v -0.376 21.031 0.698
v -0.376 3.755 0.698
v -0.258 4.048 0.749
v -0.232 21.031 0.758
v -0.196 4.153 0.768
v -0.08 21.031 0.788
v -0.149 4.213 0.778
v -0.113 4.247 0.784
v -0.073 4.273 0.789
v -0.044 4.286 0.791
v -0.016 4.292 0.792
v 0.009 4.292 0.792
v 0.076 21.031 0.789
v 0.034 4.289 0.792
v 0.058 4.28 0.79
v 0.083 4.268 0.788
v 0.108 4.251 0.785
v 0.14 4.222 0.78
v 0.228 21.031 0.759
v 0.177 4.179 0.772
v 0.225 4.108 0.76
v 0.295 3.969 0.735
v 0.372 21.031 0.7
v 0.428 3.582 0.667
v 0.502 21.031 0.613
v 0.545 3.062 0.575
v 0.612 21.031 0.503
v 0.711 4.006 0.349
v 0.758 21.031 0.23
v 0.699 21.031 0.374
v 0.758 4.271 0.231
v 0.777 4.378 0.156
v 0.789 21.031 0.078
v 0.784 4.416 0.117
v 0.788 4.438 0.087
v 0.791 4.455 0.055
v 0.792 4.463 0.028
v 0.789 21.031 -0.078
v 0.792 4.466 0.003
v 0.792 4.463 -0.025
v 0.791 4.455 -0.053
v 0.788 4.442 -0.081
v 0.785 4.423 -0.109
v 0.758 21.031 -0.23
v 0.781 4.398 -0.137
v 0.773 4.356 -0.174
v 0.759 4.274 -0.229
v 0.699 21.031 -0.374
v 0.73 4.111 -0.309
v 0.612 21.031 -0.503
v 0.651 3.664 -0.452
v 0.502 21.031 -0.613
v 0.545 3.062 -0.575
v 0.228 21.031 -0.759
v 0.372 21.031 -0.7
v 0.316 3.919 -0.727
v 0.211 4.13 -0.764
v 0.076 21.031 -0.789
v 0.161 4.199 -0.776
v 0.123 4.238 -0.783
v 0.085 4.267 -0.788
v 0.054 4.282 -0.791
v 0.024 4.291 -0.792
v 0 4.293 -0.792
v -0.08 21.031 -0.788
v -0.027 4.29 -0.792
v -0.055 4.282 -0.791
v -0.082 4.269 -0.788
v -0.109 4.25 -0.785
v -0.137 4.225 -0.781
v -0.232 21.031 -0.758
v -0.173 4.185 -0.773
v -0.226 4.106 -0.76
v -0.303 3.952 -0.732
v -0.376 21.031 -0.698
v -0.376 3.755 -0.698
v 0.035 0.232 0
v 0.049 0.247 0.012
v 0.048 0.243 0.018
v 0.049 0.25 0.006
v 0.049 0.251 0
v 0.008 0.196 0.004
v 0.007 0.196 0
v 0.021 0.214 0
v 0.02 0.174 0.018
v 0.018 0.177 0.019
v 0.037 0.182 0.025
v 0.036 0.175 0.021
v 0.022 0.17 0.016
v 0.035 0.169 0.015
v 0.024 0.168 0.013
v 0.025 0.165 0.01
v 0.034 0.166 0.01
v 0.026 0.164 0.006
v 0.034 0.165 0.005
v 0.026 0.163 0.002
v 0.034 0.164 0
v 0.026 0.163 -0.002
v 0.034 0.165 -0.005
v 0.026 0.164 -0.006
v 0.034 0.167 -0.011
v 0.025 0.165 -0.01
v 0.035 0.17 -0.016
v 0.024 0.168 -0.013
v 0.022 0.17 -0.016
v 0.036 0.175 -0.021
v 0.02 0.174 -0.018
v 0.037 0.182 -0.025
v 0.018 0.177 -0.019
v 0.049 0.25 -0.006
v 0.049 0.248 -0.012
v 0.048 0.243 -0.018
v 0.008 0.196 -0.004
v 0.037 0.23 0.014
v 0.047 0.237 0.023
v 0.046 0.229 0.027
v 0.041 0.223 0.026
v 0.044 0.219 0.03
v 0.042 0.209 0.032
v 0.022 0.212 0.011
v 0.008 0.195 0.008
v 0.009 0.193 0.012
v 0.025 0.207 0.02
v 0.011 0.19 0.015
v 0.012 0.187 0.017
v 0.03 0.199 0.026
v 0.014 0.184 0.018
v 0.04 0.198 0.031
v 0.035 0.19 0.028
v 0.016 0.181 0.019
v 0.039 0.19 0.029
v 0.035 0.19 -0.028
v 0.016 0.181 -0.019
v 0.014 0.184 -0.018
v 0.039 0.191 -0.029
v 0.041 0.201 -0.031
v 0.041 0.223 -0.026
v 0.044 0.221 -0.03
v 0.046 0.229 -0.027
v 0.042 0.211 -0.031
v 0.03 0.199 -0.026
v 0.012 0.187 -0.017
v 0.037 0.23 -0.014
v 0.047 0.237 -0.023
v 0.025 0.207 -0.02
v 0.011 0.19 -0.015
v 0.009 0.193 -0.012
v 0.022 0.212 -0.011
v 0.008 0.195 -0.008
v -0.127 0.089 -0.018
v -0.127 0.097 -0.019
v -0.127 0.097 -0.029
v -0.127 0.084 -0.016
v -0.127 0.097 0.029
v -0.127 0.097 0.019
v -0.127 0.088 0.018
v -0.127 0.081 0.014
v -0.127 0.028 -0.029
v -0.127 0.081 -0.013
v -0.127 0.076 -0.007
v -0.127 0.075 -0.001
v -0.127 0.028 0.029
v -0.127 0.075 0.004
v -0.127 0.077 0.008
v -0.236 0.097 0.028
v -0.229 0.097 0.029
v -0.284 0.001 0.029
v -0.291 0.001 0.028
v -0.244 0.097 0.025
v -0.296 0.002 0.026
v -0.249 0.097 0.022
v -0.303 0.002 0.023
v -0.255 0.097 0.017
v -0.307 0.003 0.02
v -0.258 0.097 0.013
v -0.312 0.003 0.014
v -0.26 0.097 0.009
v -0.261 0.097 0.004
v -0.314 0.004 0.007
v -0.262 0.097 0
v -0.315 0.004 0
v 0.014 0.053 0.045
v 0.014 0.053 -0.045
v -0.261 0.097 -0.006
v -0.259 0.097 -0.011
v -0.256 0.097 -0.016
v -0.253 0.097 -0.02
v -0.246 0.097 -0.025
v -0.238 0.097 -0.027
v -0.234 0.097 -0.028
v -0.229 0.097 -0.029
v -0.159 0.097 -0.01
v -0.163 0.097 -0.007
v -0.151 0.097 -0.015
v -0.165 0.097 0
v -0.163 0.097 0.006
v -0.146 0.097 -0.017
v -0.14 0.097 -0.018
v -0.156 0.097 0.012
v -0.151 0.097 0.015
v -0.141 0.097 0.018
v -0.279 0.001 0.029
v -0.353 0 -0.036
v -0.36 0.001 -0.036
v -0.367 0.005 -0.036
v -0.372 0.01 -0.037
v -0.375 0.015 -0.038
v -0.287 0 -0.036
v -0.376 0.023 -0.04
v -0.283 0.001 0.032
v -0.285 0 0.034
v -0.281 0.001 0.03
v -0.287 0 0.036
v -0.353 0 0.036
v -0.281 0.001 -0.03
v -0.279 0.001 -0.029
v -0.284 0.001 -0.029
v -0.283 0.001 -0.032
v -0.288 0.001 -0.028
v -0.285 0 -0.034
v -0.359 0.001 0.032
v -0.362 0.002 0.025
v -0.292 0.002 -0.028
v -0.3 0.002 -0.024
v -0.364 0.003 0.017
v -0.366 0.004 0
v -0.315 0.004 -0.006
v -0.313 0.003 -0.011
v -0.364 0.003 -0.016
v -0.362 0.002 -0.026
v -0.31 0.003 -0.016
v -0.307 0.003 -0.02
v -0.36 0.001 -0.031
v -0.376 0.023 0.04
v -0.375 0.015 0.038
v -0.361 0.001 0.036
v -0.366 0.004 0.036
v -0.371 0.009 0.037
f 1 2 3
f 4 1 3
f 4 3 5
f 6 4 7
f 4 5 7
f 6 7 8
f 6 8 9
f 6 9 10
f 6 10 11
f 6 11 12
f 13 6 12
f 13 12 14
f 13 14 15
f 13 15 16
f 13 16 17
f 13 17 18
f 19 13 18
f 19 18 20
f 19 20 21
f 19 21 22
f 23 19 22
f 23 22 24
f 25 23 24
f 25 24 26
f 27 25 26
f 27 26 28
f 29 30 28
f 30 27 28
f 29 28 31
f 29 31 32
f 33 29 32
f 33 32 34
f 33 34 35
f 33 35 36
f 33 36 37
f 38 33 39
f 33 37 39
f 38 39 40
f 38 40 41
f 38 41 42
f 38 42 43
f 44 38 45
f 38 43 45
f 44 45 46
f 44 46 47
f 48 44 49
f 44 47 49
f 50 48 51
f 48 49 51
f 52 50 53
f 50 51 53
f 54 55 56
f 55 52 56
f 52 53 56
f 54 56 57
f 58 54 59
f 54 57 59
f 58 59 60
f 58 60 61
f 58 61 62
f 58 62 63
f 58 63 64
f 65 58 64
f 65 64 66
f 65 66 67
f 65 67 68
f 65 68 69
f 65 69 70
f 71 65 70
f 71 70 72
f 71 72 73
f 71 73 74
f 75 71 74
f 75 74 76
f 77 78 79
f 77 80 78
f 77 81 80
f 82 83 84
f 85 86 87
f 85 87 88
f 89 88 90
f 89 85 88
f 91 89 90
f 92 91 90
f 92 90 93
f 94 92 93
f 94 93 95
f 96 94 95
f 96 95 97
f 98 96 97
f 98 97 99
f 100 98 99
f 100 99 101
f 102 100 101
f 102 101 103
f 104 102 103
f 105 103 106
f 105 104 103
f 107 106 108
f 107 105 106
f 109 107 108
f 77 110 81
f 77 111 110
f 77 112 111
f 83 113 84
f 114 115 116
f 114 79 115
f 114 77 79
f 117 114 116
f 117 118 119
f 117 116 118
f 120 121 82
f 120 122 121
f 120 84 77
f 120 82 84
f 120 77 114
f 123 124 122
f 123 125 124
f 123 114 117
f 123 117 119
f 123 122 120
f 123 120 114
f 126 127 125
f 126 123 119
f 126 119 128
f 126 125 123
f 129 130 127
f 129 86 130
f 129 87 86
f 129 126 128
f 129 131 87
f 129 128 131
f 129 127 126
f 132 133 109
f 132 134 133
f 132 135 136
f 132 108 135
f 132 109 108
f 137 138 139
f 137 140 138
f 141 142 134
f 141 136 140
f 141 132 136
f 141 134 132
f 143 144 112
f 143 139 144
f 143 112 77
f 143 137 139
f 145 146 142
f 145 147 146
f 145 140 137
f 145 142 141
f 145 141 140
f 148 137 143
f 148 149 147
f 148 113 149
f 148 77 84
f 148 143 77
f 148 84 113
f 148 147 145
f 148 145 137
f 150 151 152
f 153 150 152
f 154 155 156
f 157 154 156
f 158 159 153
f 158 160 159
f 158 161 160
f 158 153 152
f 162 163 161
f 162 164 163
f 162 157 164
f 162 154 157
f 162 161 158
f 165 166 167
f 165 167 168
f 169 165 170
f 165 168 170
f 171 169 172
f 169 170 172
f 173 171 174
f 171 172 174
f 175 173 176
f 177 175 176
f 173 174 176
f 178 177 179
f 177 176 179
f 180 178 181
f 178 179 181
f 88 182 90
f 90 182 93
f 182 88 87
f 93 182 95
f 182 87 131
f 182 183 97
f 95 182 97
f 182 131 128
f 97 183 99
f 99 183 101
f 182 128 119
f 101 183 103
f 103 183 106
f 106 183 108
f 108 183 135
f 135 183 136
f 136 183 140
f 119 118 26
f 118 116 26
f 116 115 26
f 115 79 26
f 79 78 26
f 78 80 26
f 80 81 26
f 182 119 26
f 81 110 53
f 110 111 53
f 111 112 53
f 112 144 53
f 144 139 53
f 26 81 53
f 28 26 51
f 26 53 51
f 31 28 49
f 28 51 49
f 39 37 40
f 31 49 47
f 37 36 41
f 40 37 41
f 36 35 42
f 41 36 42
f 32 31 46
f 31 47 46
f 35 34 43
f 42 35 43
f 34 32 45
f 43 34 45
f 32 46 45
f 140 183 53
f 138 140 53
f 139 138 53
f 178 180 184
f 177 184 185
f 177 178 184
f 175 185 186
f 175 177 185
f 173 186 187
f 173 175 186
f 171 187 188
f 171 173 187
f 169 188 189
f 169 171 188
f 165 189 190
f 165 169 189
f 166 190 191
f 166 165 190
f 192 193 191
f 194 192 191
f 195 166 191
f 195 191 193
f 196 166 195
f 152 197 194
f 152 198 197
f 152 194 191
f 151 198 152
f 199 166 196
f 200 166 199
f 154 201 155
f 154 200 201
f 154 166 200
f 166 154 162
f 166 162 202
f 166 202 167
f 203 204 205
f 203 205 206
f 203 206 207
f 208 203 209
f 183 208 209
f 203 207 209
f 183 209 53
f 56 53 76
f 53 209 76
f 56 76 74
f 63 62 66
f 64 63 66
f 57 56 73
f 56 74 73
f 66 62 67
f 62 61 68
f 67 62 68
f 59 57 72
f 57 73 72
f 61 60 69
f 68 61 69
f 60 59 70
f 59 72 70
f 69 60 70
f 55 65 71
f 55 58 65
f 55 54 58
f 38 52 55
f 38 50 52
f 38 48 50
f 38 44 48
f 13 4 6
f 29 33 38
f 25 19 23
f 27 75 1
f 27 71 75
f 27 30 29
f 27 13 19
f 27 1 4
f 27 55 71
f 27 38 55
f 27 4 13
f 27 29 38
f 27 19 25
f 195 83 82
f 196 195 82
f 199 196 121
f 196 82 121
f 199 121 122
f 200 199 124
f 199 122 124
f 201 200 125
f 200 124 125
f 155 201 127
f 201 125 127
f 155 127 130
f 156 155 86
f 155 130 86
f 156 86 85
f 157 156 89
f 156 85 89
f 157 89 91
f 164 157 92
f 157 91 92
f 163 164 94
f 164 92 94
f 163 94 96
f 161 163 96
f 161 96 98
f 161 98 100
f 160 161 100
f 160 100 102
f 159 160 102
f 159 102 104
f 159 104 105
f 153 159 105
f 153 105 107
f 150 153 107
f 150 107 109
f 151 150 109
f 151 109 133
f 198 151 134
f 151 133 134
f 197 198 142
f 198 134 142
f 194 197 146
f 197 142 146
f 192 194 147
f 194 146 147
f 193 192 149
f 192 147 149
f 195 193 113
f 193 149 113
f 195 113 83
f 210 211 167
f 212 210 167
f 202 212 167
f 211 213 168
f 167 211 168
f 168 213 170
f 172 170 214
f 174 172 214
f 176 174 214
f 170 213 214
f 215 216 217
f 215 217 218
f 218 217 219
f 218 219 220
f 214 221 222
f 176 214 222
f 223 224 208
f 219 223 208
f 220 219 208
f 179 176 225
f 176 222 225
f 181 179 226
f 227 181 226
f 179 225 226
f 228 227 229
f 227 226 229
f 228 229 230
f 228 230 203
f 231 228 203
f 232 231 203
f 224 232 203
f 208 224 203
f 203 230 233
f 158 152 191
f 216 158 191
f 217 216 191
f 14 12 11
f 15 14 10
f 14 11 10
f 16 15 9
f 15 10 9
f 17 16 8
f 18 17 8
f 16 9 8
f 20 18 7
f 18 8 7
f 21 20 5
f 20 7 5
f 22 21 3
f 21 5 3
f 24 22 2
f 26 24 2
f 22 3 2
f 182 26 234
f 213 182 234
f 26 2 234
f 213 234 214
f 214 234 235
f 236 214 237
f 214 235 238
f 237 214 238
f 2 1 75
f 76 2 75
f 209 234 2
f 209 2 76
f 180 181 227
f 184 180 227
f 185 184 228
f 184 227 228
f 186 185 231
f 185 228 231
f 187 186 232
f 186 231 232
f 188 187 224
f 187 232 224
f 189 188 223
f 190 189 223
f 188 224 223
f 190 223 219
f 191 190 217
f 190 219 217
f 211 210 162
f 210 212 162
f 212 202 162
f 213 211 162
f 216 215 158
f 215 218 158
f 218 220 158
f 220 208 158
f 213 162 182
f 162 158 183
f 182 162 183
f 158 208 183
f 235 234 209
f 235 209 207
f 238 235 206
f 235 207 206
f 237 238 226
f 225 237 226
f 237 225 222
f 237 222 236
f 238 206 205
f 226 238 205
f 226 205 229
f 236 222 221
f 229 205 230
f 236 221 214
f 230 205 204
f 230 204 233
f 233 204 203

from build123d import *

# Parameters (mm, degrees)
TD_SKETCH_R                             = 0.79248
TL_FEATURE_DEPTH                        = 21.0312
TDF_STD_SKETCH_W                        = 2.09296
TDF_STD_SKETCH_H                        = 2.09296
TDF_STD_FEATURE_DEPTH                   = 22.061040395
ISA_20_STD_FEATURE_DEPTH                = 22.061040395
ISA_20_STD_FEATURE_DEPTH_BACK           = 22.061040395
F_10BA_STD_FEATURE_DEPTH                = 22.061040395
F_10BA_STD_FEATURE_DEPTH_BACK           = 22.061040395
FRO_STD_FEATURE_DEPTH                   = 22.061040395
FRO_STD_FEATURE_DEPTH_BACK              = 22.061040395
C_STD_FEATURE_DEPTH                     = 22.061040395
C_STD_FEATURE_DEPTH_BACK                = 22.061040395
ERW_STD_FEATURE_DEPTH                   = 0.028575
H_STD_FEATURE_REACH                     = 22.881
H_STD_SKETCH_R                          = 0.01905
H_STD_SKETCH_3_R                        = 0.01905
FUNNEL_FINAL_DIAMETRE_STD_FEATURE_DEPTH = 2.499995
FUNNEL_FINAL_DIAMETRE_STD_FEATURE_DRAFT = -22.5
ROUND_BR_STD_FEATURE_START              = -1
ROUND_BR_STD_FEATURE_DEPTH              = 1.020088772


with BuildPart() as part:
    # TD_sketch → TL_feature (new body)
    with BuildSketch(Plane(origin=(0, 0, 0), x_dir=(1, 0, 0), z_dir=(0, 1, 0))):
        with Locations(Location((0, 0, 0), (0, 0, 270))):
            Circle(TD_SKETCH_R)
    extrude(amount=TL_FEATURE_DEPTH)

    # TDF_STD_sketch → TDF_STD_feature (cut, through all)
    with BuildSketch(Plane(origin=(0, 0, 0), x_dir=(1, 0, 0), z_dir=(0, 1, 0))):
        with Locations((-1.4224, 0)):
            Rectangle(TDF_STD_SKETCH_W, TDF_STD_SKETCH_H)
    extrude(amount=TDF_STD_FEATURE_DEPTH, mode=Mode.SUBTRACT)

    # ISA_20_STD_sketch → ISA_20_STD_feature (cut, two sides: drawn at the far end of the back side and taken through both)
    with BuildSketch(Plane(origin=(0, 0, 0), x_dir=(0, 0, -1), z_dir=(1, 0, 0)).offset(-ISA_20_STD_FEATURE_DEPTH_BACK)):
        Polygon((-12.952451681, 73.255332957), (-3.743927997, 21.0312), (-0.03556, 0), (0.03556, 0), (3.743927997, 21.0312), (12.952451681, 73.255332957), (12.952451681, -32.804215817), (-12.952451681, -32.804215817), align=None)
    extrude(amount=ISA_20_STD_FEATURE_DEPTH + ISA_20_STD_FEATURE_DEPTH_BACK, mode=Mode.SUBTRACT)

    # 10BA_STD_sketch → 10BA_STD_feature (cut, two sides: drawn at the far end of the back side and taken through both)
    with BuildSketch(Plane.XY.offset(-F_10BA_STD_FEATURE_DEPTH_BACK)):
        Polygon((-53.226091717, 0), (-0.37592, 0), (-0.28702, 0), (0.014453164, 0.053157853), (3.713447997, 21.0312), (12.890784005, 73.078458855), (91.272293615, 2.163710365), (25.155417893, -70.914748491), align=None)
    extrude(amount=F_10BA_STD_FEATURE_DEPTH + F_10BA_STD_FEATURE_DEPTH_BACK, mode=Mode.SUBTRACT)

    # FRO_STD_sketch → FRO_STD_feature (cut, two sides: drawn at the far end of the back side and taken through both)
    with BuildSketch(Plane.XY.offset(-FRO_STD_FEATURE_DEPTH_BACK)):
        with BuildLine():
            Line((-0.37592, 52.147609748), (-0.37592, 0.02286))
            ThreePointArc((-0.37592, 0.02286), (-0.369224461, 0.006695539), (-0.35306, 0))
            Line((-0.35306, 0), (51.771689748, 0))
            Line((51.771689748, 0), (-21.943838281, -73.715528029))
            Line((-21.943838281, -73.715528029), (-74.091448029, -21.567918281))
            Line((-74.091448029, -21.567918281), (-0.37592, 52.147609748))
        make_face()
    extrude(amount=FRO_STD_FEATURE_DEPTH + FRO_STD_FEATURE_DEPTH_BACK, mode=Mode.SUBTRACT)

    # C_STD_sketch → C_STD_feature (cut, two sides: drawn at the far end of the back side and taken through both)
    with BuildSketch(Plane(origin=(0, 0, 0), x_dir=(0, 0, -1), z_dir=(1, 0, 0)).offset(-C_STD_FEATURE_DEPTH_BACK)):
        with BuildLine():
            Line((-50.946547499, -11.043402092), (-0.035537314, 0))
            ThreePointArc((-0.035537314, 0), (0, 0.00381), (0.035537314, 0))
            Line((0.035537314, 0), (50.946547499, -11.043402092))
            Line((50.946547499, -11.043402092), (50.946547499, -115.233376423))
            Line((50.946547499, -115.233376423), (-50.946547499, -115.233376423))
            Line((-50.946547499, -115.233376423), (-50.946547499, -11.043402092))
        make_face()
    extrude(amount=C_STD_FEATURE_DEPTH + C_STD_FEATURE_DEPTH_BACK, mode=Mode.SUBTRACT)


with BuildPart() as body_2:
    # ERW_STD_sketch → ERW_STD_feature (new, symmetric)
    with BuildSketch(Plane.XY):
        Polygon((-0.127, 0.09652), (-0.127, 0), (-0.3175, 0), (-0.261774152, 0.09652), align=None)
    extrude(amount=ERW_STD_FEATURE_DEPTH, both=True)

    # H_STD_sketch → H_STD_feature (add, up to next)
    with BuildSketch(Plane(origin=(0.01693898, 0.179623209, 0), x_dir=(0, 0, -1), z_dir=(0.8660254037844415, 0.4999999999999953, 0)), mode=Mode.PRIVATE) as h_std_feature_sk1:
        with Locations(Location((0, 0, 0), (0, 0, 90))):
            Circle(H_STD_SKETCH_R)
    h_std_feature_tool1 = extrude(h_std_feature_sk1.sketch, amount=-H_STD_FEATURE_REACH, mode=Mode.PRIVATE) - body_2.part
    add(h_std_feature_tool1.solids().sort_by_distance((0.016939, 0.179623, 0))[0])


with BuildPart() as funnel_final_diametre_std_feature_tool:
    # H_STD_sketch<3> → funnel_final_diametre_STD_feature (with draft: the straight prism first)
    with BuildSketch(Plane(origin=(0.01693898, 0.179623209, 0), x_dir=(0, 0, -1), z_dir=(0.8660254037844415, 0.4999999999999953, 0))):
        with Locations(Location((0, 0, 0), (0, 0, 90))):
            Circle(H_STD_SKETCH_3_R)
    extrude(amount=FUNNEL_FINAL_DIAMETRE_STD_FEATURE_DEPTH)
    # funnel_final_diametre_STD_feature: the draft: its side faces are tilted about the plane it starts from
    funnel_final_diametre_std_feature_sides = [funnel_final_diametre_std_feature_tool.faces().sort_by_distance(p)[0] for p in [
        (1.10899357, 0.788124175, 0),
    ]]
    draft(funnel_final_diametre_std_feature_sides, Plane(origin=(0.01693898, 0.179623209, 0), x_dir=(0, 0, -1), z_dir=(0.8660254037844415, 0.4999999999999953, 0)), FUNNEL_FINAL_DIAMETRE_STD_FEATURE_DRAFT)


with BuildPart() as body_2_1:
    add(body_2.part)

    # funnel_final_diametre_STD_feature: add funnel_final_diametre_std_feature_tool
    add(funnel_final_diametre_std_feature_tool.part)

    # ROUND_BR_STD_feature: read off the stored shape, not the designer's step
    # ROUND_BR_STD_feature outline → ROUND_BR_STD_feature (cut)
    with BuildSketch(Plane(origin=(0, 0, 0), x_dir=(0.8660254037844362, -0.5000000000000042, 0), z_dir=(0.5000000000000042, 0.8660254037844363, 0)).offset(ROUND_BR_STD_FEATURE_START)):
        with BuildLine():
            Line((-0.274963066, -0.028575), (-0.246388066, -0.028575))
            ThreePointArc((-0.246388066, -0.028575), (-0.266593642, -0.020205576), (-0.274963066, 0))
            Line((-0.274963066, 0), (-0.274963066, -0.028575))
        make_face()
        with BuildLine():
            Line((-0.274963066, 0.028575), (-0.274963066, 0))
            ThreePointArc((-0.274963066, 0), (-0.266593642, 0.020205576), (-0.246388066, 0.028575))
            Line((-0.246388066, 0.028575), (-0.274963066, 0.028575))
        make_face()
    extrude(amount=ROUND_BR_STD_FEATURE_DEPTH, mode=Mode.SUBTRACT)


with BuildPart() as part_1:
    add(part.part)

    # COMBINE_STD_feature: cut body 2
    add(body_2_1.part, mode=Mode.SUBTRACT)


solid = part_1.part
